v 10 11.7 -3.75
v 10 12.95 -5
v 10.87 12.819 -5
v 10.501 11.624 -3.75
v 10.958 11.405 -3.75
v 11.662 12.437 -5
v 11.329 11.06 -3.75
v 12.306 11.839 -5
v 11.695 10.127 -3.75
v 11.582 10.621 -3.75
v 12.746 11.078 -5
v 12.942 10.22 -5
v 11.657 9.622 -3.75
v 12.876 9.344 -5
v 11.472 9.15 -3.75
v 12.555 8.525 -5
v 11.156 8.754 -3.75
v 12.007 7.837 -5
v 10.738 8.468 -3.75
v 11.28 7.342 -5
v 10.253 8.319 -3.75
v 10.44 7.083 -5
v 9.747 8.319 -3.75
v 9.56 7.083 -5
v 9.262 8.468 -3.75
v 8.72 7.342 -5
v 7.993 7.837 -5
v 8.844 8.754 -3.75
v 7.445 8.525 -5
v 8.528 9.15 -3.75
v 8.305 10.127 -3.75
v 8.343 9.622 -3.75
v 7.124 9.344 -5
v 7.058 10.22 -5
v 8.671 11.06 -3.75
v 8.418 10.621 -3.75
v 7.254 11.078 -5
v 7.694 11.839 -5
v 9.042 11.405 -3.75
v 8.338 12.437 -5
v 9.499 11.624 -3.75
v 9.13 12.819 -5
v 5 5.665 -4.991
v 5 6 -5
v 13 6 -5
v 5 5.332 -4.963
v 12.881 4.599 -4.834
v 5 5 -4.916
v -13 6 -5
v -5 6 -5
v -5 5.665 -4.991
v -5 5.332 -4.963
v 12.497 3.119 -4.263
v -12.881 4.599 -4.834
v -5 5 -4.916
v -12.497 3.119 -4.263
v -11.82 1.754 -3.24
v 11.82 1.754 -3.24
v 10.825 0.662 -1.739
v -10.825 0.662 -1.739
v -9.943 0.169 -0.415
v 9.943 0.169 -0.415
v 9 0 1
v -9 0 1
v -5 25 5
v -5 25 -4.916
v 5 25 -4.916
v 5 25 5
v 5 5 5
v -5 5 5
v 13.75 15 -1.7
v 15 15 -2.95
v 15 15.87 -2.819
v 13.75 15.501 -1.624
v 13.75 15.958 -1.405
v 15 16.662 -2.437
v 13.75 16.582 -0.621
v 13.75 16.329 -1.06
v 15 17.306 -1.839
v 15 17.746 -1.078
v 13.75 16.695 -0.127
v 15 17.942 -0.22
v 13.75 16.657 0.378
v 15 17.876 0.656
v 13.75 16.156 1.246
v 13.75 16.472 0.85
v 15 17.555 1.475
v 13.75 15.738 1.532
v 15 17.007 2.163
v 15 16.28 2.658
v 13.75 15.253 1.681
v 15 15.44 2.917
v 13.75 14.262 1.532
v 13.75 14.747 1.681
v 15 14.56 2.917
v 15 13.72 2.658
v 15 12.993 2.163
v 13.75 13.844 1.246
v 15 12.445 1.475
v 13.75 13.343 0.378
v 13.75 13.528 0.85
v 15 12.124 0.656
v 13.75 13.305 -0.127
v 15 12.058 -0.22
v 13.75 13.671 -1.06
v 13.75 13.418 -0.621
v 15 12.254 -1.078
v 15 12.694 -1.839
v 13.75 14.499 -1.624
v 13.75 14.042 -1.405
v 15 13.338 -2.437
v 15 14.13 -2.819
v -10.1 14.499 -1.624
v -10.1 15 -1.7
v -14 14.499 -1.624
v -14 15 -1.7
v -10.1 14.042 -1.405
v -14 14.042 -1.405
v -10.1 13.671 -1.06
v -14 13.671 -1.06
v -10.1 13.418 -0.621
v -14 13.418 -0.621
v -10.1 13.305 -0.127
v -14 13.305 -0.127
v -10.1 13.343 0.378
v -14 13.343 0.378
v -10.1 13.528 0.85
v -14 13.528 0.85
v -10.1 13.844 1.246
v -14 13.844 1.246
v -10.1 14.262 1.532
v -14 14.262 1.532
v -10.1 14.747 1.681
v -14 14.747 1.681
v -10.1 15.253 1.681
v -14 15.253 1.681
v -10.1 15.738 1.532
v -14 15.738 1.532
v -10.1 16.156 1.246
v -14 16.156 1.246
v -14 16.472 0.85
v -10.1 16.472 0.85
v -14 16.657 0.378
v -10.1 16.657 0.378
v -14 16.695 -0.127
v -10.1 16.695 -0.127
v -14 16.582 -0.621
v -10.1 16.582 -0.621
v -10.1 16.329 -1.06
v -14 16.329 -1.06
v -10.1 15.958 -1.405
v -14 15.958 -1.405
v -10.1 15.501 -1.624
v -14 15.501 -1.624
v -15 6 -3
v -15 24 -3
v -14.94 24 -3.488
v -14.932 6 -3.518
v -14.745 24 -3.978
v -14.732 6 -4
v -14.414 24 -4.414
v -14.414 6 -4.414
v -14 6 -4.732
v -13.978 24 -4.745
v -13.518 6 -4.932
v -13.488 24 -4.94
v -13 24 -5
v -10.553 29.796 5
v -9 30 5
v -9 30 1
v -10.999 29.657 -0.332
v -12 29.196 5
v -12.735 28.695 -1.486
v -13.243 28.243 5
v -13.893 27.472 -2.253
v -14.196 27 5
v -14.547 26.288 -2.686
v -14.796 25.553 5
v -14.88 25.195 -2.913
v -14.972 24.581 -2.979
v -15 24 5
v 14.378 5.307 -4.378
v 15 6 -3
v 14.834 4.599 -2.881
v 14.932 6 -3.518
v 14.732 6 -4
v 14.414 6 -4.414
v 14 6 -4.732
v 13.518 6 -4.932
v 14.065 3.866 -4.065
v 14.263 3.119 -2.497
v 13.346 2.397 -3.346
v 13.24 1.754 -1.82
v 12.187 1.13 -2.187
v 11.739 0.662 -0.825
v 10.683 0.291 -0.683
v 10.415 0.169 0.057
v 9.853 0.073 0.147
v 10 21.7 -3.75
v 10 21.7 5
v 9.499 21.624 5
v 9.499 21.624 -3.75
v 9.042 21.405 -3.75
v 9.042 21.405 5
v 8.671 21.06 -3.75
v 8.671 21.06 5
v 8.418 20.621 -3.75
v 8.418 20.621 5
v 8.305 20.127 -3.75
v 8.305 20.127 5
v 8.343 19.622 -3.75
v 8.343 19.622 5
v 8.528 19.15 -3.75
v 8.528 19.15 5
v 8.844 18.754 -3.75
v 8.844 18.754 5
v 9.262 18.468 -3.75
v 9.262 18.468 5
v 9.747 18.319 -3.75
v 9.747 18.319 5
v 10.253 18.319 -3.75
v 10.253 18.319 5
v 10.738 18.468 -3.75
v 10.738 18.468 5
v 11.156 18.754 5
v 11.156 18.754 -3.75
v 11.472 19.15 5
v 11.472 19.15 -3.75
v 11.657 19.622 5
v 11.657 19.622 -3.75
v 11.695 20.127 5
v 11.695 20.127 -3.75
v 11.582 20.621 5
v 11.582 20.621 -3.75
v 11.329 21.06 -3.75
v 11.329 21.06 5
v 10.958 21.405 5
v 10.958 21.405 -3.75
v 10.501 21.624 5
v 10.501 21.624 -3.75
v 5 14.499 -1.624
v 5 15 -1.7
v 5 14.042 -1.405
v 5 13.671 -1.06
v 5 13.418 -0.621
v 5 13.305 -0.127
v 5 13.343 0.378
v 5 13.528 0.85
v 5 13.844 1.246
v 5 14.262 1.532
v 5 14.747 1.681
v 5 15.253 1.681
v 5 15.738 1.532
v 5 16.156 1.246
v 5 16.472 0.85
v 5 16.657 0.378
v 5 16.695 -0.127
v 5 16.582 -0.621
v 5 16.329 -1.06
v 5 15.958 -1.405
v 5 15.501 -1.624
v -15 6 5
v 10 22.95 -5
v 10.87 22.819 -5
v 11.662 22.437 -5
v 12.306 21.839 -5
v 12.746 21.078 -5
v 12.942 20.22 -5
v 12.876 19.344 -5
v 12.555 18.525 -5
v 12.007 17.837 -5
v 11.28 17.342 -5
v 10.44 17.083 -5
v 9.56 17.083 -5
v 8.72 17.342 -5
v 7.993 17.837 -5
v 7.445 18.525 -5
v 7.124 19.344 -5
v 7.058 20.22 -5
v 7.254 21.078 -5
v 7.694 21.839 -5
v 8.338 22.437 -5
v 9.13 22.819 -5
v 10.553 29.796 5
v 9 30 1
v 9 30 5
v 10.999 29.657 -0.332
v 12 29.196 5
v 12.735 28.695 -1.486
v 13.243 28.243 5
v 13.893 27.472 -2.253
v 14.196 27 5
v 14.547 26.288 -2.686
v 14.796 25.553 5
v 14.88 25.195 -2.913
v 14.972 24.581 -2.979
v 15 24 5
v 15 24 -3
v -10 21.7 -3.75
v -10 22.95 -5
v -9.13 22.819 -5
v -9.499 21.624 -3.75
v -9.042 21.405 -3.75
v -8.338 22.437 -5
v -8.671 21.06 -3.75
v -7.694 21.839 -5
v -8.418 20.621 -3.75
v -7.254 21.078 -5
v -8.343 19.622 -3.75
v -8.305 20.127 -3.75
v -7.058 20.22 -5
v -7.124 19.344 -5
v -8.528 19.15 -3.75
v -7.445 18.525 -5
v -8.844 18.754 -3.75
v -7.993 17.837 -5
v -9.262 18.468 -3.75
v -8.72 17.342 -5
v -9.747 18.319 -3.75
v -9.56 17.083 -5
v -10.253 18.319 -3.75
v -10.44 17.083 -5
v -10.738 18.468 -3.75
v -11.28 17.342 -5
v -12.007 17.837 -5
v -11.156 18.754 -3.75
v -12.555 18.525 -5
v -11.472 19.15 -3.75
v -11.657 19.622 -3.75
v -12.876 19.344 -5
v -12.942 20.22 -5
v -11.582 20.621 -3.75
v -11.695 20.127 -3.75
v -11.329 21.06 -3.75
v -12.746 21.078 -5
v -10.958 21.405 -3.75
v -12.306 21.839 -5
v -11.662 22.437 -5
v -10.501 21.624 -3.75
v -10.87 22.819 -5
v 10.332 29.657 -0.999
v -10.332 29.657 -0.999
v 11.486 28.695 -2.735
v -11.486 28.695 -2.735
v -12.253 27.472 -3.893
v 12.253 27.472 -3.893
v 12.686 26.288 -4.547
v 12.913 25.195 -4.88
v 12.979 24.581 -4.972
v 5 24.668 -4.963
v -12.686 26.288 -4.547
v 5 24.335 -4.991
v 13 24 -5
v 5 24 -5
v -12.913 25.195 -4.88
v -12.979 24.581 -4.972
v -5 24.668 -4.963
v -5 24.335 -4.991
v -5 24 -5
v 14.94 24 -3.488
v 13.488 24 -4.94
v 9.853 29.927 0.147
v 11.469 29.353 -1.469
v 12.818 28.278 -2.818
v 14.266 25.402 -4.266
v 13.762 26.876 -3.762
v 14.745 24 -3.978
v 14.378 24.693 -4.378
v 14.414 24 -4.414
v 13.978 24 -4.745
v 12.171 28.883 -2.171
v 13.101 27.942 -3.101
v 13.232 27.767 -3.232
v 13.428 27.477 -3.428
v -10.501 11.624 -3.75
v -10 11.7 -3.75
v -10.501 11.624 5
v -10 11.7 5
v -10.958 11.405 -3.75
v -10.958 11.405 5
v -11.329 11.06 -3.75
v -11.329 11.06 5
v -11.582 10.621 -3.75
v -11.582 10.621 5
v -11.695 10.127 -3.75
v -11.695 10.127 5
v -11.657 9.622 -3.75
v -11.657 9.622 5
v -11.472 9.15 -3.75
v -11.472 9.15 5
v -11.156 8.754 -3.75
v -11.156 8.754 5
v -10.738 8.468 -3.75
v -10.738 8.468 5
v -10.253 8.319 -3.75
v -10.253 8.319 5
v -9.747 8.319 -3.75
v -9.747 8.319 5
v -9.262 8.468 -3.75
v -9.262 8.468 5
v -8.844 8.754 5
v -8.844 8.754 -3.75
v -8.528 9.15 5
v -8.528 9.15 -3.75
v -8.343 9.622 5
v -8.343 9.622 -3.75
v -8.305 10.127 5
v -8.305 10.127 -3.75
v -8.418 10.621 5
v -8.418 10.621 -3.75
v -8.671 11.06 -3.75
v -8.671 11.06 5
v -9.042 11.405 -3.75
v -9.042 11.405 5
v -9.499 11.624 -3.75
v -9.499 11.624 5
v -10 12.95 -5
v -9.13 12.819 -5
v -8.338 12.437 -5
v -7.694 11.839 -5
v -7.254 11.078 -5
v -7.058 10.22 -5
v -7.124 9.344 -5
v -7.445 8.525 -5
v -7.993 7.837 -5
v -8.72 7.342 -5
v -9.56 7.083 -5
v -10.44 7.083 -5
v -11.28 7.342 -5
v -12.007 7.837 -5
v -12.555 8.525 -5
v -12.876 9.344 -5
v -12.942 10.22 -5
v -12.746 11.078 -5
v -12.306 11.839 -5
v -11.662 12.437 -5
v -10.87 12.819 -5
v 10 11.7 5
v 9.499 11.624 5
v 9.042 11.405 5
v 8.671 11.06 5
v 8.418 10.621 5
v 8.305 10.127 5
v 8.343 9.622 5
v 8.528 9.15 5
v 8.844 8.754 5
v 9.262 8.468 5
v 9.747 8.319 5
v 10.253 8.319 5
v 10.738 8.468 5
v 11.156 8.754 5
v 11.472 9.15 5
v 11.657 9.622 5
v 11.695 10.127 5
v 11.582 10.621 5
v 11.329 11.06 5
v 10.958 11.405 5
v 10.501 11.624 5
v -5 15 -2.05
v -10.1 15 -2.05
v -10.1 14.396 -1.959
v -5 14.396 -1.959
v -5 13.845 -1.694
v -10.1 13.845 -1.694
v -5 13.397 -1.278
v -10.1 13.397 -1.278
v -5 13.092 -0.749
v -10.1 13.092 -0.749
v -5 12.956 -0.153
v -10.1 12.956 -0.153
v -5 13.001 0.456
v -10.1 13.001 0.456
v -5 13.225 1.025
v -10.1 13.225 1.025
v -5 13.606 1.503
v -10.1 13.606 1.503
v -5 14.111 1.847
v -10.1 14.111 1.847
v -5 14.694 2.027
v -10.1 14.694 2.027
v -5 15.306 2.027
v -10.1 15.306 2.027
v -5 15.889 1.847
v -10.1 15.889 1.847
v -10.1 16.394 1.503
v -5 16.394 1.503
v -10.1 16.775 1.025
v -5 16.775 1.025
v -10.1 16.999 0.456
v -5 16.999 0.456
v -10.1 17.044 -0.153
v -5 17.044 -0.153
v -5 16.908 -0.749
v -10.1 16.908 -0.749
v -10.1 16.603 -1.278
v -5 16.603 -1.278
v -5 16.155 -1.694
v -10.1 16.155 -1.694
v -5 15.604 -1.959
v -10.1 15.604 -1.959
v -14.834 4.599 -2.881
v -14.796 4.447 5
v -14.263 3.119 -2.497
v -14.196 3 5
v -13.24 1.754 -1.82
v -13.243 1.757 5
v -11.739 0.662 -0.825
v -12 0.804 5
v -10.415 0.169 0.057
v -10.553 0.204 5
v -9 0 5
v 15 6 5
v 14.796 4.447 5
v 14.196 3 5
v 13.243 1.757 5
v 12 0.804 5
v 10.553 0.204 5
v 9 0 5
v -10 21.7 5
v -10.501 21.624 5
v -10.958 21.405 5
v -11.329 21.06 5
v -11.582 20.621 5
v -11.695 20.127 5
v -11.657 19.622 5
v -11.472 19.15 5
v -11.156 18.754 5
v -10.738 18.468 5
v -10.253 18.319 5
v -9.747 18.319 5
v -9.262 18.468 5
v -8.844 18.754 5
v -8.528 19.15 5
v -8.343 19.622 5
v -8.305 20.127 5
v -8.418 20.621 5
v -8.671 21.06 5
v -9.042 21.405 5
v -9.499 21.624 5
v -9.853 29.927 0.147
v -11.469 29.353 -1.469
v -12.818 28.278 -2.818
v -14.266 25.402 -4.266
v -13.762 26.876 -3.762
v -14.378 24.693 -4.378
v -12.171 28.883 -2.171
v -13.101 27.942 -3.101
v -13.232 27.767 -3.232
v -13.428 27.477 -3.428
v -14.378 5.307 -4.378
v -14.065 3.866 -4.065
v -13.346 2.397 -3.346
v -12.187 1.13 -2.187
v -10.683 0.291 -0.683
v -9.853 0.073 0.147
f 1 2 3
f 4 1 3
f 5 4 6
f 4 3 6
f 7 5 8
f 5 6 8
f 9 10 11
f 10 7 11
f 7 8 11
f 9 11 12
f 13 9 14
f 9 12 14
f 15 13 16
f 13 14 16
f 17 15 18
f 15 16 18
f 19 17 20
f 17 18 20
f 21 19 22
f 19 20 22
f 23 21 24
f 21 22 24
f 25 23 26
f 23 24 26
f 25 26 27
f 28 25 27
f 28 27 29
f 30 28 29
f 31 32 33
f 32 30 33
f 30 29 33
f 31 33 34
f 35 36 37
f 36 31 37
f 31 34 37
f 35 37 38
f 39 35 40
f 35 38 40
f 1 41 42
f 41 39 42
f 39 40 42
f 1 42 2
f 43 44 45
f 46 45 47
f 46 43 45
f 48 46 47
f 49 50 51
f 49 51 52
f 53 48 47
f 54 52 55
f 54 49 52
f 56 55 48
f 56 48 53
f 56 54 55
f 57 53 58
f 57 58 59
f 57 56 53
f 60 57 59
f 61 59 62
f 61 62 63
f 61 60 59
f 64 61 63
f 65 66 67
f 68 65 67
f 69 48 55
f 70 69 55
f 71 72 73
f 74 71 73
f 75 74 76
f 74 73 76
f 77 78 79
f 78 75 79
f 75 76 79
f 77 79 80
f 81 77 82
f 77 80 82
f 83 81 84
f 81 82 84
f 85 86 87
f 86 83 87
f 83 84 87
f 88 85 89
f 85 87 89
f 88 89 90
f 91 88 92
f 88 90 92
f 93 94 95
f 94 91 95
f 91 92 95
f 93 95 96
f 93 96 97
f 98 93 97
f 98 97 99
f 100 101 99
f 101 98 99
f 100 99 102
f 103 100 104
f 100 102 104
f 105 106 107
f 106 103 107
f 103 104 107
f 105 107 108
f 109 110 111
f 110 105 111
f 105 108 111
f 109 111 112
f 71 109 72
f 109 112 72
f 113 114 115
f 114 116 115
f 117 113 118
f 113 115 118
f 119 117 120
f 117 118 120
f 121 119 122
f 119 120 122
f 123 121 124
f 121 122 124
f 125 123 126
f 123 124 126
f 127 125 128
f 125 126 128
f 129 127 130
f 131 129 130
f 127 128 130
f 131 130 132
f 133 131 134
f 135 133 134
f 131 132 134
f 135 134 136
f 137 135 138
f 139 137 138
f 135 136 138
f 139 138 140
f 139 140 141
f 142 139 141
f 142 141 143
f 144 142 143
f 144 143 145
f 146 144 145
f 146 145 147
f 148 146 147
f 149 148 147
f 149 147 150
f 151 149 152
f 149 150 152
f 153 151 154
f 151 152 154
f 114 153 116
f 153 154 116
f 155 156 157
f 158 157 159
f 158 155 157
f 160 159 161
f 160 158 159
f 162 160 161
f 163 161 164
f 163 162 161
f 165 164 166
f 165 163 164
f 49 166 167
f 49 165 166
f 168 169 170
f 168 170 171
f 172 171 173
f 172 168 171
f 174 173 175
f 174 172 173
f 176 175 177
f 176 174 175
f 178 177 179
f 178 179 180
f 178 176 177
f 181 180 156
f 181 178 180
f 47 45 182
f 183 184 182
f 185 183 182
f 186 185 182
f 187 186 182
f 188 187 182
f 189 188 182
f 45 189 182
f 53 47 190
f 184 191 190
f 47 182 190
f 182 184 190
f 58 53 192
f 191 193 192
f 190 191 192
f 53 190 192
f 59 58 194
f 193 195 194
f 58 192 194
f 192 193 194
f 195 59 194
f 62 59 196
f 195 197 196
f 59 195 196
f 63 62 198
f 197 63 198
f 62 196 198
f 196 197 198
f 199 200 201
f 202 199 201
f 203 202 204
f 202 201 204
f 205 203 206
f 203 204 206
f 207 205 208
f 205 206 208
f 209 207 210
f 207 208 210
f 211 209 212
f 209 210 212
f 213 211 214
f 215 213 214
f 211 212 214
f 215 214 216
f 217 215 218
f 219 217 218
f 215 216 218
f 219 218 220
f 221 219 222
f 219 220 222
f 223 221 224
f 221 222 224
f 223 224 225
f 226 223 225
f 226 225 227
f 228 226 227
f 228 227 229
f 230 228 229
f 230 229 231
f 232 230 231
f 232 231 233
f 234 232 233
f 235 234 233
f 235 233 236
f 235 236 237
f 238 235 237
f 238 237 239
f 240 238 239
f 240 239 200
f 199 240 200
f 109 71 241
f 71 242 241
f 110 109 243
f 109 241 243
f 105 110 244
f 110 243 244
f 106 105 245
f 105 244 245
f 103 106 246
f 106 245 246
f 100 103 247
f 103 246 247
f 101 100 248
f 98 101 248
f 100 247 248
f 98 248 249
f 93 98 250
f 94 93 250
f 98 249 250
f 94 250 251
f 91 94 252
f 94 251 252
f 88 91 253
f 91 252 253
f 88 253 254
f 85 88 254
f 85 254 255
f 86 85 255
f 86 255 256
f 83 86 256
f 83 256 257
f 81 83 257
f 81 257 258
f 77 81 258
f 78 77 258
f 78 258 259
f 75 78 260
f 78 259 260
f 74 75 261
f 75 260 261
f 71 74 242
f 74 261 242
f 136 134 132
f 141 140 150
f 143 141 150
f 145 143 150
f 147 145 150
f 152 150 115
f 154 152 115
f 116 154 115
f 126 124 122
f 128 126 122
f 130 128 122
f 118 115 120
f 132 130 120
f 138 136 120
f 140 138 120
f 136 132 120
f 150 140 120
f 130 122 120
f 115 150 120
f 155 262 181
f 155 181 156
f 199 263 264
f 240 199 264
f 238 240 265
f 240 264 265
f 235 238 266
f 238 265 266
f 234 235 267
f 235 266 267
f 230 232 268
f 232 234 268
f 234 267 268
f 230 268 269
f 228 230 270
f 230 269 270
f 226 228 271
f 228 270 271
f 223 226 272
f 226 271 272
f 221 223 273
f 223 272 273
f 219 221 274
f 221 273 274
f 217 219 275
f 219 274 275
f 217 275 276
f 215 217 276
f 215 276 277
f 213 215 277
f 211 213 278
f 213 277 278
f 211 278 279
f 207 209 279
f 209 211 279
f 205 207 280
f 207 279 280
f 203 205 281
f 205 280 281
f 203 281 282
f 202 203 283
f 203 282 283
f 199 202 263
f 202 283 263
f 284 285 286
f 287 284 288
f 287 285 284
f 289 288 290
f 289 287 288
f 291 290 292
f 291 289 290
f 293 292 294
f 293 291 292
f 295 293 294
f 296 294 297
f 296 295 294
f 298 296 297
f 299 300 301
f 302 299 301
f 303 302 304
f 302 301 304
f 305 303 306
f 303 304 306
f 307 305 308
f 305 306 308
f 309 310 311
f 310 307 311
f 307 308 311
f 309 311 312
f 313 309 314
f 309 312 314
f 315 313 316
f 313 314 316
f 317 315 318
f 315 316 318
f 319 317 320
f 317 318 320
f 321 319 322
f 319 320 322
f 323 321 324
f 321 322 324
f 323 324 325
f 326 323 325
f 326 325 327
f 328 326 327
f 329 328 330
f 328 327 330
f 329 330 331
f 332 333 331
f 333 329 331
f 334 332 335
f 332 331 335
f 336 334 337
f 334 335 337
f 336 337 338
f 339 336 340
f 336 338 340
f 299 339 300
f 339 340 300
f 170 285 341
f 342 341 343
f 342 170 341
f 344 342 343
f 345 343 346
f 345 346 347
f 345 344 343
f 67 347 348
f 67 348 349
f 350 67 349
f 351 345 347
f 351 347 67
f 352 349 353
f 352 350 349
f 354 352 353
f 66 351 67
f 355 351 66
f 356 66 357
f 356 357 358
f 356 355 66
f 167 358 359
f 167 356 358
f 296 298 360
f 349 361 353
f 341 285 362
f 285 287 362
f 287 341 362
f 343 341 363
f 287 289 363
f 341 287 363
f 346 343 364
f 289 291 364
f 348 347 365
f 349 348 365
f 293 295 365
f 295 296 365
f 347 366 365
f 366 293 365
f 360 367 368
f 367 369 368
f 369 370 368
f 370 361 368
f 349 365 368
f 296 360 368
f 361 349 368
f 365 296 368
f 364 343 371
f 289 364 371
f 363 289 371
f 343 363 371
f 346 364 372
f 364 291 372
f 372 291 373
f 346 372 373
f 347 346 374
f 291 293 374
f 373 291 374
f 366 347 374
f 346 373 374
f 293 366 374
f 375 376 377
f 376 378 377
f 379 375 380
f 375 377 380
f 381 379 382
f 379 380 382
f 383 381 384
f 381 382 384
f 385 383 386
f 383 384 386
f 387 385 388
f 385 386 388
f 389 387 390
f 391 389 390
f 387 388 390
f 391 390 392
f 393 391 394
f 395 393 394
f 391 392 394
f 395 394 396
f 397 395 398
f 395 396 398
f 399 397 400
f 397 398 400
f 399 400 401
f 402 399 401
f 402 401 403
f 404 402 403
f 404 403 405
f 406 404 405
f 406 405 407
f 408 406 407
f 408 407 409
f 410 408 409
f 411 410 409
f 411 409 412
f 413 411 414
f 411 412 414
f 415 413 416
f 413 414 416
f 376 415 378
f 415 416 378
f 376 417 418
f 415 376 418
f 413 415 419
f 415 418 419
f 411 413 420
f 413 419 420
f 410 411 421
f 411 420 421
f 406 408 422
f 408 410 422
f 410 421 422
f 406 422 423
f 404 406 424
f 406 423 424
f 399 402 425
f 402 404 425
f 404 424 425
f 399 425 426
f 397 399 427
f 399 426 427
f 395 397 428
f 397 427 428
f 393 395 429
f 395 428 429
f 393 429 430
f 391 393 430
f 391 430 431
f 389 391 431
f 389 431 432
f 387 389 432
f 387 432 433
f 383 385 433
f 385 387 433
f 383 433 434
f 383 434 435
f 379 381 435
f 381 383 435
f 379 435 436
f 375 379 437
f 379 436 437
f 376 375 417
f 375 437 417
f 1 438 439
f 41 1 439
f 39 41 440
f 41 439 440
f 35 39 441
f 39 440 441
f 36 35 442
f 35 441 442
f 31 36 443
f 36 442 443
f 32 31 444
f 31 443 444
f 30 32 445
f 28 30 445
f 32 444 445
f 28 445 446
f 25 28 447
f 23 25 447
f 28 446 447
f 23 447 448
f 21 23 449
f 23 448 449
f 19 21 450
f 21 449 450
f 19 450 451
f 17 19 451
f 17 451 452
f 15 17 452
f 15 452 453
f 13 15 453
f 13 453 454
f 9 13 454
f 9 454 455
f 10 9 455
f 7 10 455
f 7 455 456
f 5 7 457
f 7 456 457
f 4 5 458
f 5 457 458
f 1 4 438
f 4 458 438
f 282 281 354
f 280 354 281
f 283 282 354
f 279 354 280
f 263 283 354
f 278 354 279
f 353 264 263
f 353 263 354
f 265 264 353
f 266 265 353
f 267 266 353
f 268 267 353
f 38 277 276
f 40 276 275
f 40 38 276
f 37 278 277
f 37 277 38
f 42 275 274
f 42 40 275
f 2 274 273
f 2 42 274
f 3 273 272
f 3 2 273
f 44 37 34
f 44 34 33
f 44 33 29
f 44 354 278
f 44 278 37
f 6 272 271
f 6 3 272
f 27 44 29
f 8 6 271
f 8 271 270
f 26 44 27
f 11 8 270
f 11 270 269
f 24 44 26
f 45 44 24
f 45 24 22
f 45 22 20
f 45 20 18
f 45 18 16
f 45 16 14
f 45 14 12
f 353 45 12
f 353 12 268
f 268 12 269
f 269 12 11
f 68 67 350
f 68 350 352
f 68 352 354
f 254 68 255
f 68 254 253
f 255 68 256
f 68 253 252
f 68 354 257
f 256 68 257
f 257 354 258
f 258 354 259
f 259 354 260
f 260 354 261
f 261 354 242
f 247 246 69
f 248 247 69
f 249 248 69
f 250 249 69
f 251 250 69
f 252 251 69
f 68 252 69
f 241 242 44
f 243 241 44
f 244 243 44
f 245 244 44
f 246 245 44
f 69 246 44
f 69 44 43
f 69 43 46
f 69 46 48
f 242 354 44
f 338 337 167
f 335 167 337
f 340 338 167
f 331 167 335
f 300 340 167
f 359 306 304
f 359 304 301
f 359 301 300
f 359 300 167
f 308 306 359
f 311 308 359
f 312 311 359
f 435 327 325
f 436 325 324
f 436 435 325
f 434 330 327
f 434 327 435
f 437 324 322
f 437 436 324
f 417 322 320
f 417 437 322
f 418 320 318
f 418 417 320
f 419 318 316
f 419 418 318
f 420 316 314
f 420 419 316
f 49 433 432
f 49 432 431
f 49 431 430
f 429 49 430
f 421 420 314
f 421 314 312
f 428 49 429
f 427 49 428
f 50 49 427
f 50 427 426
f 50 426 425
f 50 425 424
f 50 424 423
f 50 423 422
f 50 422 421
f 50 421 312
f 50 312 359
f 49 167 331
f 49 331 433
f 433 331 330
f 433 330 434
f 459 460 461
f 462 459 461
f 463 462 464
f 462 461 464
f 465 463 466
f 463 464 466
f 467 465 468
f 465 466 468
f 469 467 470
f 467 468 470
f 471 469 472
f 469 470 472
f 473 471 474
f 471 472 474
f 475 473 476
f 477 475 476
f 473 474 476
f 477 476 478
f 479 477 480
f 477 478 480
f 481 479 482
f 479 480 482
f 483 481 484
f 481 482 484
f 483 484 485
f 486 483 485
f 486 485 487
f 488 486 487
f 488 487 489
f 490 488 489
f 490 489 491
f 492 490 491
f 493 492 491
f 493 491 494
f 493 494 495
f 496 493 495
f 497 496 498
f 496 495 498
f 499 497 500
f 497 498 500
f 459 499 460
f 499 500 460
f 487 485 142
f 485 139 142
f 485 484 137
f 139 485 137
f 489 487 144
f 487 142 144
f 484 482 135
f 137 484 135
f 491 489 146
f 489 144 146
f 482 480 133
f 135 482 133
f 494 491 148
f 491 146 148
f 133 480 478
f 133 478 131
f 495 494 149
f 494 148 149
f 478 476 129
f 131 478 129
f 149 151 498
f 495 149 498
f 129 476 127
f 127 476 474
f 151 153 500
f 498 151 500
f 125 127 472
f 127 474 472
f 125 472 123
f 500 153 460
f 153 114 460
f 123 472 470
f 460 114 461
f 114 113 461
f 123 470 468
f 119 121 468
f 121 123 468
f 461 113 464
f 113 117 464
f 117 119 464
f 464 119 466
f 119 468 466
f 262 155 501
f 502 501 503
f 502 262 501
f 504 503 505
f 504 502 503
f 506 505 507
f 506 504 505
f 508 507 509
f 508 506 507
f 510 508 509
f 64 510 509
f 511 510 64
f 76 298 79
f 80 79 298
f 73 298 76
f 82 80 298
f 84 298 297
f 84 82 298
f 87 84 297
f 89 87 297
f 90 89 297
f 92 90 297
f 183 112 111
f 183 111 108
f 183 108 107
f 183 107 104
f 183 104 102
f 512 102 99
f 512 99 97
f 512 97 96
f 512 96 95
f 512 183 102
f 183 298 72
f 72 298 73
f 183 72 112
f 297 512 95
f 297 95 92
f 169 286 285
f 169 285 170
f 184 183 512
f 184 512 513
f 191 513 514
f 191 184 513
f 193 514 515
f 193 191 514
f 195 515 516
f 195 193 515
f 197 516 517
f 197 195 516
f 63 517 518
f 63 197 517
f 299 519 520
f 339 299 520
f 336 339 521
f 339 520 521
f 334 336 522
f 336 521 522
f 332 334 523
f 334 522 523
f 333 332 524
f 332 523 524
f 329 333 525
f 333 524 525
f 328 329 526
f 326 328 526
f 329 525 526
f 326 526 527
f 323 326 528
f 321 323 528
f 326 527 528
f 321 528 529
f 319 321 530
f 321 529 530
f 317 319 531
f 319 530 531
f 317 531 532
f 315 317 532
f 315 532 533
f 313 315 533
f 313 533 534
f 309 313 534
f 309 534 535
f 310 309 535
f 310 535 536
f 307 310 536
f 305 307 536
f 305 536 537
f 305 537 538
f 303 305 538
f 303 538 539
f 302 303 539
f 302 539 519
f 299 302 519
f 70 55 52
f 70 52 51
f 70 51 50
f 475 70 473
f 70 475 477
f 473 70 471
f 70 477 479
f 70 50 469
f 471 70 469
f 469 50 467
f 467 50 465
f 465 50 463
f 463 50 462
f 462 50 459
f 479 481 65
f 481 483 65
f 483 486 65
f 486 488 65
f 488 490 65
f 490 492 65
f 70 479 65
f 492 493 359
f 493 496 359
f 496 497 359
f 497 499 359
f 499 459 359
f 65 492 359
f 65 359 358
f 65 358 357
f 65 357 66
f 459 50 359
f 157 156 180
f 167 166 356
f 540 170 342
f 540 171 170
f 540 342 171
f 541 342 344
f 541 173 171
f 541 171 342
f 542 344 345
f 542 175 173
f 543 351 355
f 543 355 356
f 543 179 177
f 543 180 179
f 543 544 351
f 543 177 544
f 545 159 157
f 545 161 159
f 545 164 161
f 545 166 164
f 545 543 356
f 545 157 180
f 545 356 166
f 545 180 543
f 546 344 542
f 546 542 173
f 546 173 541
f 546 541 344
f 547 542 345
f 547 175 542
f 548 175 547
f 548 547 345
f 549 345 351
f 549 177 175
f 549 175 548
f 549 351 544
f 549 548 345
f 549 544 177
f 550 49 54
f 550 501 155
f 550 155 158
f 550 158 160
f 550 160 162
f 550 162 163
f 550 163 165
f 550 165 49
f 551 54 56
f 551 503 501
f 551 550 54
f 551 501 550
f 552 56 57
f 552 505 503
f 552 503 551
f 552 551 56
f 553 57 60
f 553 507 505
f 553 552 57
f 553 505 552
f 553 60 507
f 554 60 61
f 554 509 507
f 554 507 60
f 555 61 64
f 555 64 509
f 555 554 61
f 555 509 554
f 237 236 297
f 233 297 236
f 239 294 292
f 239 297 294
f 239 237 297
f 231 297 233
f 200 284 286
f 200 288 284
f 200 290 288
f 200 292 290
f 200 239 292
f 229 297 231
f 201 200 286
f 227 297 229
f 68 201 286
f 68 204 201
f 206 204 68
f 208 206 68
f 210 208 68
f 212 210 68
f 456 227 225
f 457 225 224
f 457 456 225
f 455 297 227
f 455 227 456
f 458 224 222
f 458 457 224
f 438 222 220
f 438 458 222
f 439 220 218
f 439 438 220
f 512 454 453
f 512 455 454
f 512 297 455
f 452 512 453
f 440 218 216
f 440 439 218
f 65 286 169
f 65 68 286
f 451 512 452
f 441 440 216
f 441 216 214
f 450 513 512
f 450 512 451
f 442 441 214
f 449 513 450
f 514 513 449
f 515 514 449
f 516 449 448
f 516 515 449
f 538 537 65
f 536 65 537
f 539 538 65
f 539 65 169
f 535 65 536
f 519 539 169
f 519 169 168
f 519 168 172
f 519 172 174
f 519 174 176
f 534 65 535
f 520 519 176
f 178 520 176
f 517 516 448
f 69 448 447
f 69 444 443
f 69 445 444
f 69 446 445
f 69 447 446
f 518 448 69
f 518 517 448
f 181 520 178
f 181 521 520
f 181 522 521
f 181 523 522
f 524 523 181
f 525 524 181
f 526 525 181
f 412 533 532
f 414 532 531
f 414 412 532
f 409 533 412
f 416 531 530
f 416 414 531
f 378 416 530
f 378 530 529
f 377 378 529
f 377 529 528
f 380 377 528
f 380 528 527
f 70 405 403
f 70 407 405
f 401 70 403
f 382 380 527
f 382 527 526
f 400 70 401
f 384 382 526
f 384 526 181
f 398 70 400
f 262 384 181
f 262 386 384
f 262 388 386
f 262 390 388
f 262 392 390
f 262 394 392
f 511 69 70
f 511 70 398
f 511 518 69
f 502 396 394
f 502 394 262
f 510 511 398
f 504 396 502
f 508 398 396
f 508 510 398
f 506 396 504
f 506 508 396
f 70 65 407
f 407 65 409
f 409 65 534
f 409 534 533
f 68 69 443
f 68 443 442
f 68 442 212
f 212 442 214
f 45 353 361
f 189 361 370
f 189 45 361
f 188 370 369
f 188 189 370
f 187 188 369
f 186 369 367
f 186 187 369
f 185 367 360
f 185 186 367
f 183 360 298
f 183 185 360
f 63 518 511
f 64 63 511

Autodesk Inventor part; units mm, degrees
ref_plane "YZ Plane" through (0, 0, 0) normal (1, 0, 0) x (0, 1, 0)
ref_plane "XZ Plane" through (0, 0, 0) normal (0, 1, 0) x (-1, 0, 0)
ref_plane "XY Plane" through (0, 0, 0) normal (0, 0, 1) x (1, 0, 0)
sketch "Sketch1" plane through (0, 0, 0) normal (0, 1, 0) x (-1, 0, 0)
  line L0 (-15, 5) -> (15, 5)
  line L1 (15, 5) -> (15, -5)
  line L2 (15, -5) -> (-15, -5)
  line L3 (-15, -5) -> (-15, 5)
  line L4 (-15, 5) -> (15, -5) construction
  line L5 (15, 5) -> (-15, -5) construction
  point P0 (0, 0)
  dimension "d0" = 30
  dimension "d1" = 10
extrude "Extrusion1" add sketch "Sketch1" along normal blind 30
sketch "Sketch2" plane through (15, 0, -5) normal (0, 0, -1) x (-1, 0, 0)
  line L0 (0, 0) -> (0, 30) projected
  line L1 (0, 30) -> (30, 30) projected
  line L2 (0, 0) -> (30, 30)
  line L3 (10, 5) -> (20, 5)
  line L4 (20, 5) -> (20, 25)
  line L5 (20, 25) -> (10, 25)
  line L6 (10, 25) -> (10, 5)
  line L7 (10, 5) -> (20, 25) construction
  line L8 (20, 5) -> (10, 25) construction
  point P0 (15, 0)
  point P1 (15, 15)
  dimension "d4" = 10
  dimension "d5" = 20
extrude "Extrusion2" cut sketch "Sketch2" against normal through all contours L6 L5 L4 L2 | L2 L4 L3 L6
sketch "Sketch3" plane through (15, 0, 5) normal (1, 0, 0) x (0, 0, -1)
  line L0 (10, 0) -> (0, 0) projected
  line L1 (0, 30) -> (10, 30) projected
  line L2 (0, 0) -> (10, 30)
  line L3 (5, 15) -> (17.6725, 15)
  point P0 (5, 0)
hole "Hole1" at (15, 15, 0) direction (-1, 0, 0) diameter 3.4 depth 10 countersink diameter 5.9 countersink angle 90
sketch "Sketch4" plane through (-5, 5, -5) normal (1, 0, 0) x (0, 0, -1)
  line L0 (-10, 0) -> (-10, 20) projected
  line L1 (0, 20) -> (-10, 20) projected
  line L2 (-10, 0) -> (0, 20)
  line L3 (-5, 10) -> (5, 10)
  point P0 (-5, -5)
  dimension "d15" = 10
hole "Hole2" at (-5, 15, 0) direction (-1, 0, 0) diameter 3.4 depth 9 counterbore diameter 4.1 counterbore depth 5.1
sketch "Sketch5" plane through (15, 0, -5) normal (0, 0, -1) x (-1, 0, 0)
  line L0 (30, 0) -> (0, 0) projected
  line L1 (30, 0) -> (30, 30) projected
  line L2 (0, 0) -> (30, 30)
  line L3 (5, 10) -> (25, 10)
  line L4 (25, 10) -> (25, 20)
  line L5 (25, 20) -> (5, 20)
  line L6 (5, 20) -> (5, 10)
  line L7 (5, 10) -> (25, 20) construction
  line L8 (25, 10) -> (5, 20) construction
  point P0 (15, 0)
  point P1 (15, 15)
  dimension "d23" = 20
  dimension "d24" = 10
hole "Hole3" at (10, 20, -5) at (10, 10, -5) at (-10, 10, -5) at (-10, 20, -5) direction (0, 0, 1) diameter 3.4 end through all countersink diameter 5.9 countersink angle 90
fillet "Fillet1" radius 6 6 edges at (15, 30, 0) (-15, 30, 0) (15, 0, 0) (-15, 0, 0) (0, 30, -5) (0, 0, -5)
fillet "Fillet2" radius 2 6 edges at (13.2426, 28.2426, -3.2426) (13.2426, 1.7574, -3.2426) (15, 15, -5) (-13.2426, 28.2426, -3.2426) (-13.2426, 1.7574, -3.2426) (-15, 15, -5)
properties part number "Tensor"
